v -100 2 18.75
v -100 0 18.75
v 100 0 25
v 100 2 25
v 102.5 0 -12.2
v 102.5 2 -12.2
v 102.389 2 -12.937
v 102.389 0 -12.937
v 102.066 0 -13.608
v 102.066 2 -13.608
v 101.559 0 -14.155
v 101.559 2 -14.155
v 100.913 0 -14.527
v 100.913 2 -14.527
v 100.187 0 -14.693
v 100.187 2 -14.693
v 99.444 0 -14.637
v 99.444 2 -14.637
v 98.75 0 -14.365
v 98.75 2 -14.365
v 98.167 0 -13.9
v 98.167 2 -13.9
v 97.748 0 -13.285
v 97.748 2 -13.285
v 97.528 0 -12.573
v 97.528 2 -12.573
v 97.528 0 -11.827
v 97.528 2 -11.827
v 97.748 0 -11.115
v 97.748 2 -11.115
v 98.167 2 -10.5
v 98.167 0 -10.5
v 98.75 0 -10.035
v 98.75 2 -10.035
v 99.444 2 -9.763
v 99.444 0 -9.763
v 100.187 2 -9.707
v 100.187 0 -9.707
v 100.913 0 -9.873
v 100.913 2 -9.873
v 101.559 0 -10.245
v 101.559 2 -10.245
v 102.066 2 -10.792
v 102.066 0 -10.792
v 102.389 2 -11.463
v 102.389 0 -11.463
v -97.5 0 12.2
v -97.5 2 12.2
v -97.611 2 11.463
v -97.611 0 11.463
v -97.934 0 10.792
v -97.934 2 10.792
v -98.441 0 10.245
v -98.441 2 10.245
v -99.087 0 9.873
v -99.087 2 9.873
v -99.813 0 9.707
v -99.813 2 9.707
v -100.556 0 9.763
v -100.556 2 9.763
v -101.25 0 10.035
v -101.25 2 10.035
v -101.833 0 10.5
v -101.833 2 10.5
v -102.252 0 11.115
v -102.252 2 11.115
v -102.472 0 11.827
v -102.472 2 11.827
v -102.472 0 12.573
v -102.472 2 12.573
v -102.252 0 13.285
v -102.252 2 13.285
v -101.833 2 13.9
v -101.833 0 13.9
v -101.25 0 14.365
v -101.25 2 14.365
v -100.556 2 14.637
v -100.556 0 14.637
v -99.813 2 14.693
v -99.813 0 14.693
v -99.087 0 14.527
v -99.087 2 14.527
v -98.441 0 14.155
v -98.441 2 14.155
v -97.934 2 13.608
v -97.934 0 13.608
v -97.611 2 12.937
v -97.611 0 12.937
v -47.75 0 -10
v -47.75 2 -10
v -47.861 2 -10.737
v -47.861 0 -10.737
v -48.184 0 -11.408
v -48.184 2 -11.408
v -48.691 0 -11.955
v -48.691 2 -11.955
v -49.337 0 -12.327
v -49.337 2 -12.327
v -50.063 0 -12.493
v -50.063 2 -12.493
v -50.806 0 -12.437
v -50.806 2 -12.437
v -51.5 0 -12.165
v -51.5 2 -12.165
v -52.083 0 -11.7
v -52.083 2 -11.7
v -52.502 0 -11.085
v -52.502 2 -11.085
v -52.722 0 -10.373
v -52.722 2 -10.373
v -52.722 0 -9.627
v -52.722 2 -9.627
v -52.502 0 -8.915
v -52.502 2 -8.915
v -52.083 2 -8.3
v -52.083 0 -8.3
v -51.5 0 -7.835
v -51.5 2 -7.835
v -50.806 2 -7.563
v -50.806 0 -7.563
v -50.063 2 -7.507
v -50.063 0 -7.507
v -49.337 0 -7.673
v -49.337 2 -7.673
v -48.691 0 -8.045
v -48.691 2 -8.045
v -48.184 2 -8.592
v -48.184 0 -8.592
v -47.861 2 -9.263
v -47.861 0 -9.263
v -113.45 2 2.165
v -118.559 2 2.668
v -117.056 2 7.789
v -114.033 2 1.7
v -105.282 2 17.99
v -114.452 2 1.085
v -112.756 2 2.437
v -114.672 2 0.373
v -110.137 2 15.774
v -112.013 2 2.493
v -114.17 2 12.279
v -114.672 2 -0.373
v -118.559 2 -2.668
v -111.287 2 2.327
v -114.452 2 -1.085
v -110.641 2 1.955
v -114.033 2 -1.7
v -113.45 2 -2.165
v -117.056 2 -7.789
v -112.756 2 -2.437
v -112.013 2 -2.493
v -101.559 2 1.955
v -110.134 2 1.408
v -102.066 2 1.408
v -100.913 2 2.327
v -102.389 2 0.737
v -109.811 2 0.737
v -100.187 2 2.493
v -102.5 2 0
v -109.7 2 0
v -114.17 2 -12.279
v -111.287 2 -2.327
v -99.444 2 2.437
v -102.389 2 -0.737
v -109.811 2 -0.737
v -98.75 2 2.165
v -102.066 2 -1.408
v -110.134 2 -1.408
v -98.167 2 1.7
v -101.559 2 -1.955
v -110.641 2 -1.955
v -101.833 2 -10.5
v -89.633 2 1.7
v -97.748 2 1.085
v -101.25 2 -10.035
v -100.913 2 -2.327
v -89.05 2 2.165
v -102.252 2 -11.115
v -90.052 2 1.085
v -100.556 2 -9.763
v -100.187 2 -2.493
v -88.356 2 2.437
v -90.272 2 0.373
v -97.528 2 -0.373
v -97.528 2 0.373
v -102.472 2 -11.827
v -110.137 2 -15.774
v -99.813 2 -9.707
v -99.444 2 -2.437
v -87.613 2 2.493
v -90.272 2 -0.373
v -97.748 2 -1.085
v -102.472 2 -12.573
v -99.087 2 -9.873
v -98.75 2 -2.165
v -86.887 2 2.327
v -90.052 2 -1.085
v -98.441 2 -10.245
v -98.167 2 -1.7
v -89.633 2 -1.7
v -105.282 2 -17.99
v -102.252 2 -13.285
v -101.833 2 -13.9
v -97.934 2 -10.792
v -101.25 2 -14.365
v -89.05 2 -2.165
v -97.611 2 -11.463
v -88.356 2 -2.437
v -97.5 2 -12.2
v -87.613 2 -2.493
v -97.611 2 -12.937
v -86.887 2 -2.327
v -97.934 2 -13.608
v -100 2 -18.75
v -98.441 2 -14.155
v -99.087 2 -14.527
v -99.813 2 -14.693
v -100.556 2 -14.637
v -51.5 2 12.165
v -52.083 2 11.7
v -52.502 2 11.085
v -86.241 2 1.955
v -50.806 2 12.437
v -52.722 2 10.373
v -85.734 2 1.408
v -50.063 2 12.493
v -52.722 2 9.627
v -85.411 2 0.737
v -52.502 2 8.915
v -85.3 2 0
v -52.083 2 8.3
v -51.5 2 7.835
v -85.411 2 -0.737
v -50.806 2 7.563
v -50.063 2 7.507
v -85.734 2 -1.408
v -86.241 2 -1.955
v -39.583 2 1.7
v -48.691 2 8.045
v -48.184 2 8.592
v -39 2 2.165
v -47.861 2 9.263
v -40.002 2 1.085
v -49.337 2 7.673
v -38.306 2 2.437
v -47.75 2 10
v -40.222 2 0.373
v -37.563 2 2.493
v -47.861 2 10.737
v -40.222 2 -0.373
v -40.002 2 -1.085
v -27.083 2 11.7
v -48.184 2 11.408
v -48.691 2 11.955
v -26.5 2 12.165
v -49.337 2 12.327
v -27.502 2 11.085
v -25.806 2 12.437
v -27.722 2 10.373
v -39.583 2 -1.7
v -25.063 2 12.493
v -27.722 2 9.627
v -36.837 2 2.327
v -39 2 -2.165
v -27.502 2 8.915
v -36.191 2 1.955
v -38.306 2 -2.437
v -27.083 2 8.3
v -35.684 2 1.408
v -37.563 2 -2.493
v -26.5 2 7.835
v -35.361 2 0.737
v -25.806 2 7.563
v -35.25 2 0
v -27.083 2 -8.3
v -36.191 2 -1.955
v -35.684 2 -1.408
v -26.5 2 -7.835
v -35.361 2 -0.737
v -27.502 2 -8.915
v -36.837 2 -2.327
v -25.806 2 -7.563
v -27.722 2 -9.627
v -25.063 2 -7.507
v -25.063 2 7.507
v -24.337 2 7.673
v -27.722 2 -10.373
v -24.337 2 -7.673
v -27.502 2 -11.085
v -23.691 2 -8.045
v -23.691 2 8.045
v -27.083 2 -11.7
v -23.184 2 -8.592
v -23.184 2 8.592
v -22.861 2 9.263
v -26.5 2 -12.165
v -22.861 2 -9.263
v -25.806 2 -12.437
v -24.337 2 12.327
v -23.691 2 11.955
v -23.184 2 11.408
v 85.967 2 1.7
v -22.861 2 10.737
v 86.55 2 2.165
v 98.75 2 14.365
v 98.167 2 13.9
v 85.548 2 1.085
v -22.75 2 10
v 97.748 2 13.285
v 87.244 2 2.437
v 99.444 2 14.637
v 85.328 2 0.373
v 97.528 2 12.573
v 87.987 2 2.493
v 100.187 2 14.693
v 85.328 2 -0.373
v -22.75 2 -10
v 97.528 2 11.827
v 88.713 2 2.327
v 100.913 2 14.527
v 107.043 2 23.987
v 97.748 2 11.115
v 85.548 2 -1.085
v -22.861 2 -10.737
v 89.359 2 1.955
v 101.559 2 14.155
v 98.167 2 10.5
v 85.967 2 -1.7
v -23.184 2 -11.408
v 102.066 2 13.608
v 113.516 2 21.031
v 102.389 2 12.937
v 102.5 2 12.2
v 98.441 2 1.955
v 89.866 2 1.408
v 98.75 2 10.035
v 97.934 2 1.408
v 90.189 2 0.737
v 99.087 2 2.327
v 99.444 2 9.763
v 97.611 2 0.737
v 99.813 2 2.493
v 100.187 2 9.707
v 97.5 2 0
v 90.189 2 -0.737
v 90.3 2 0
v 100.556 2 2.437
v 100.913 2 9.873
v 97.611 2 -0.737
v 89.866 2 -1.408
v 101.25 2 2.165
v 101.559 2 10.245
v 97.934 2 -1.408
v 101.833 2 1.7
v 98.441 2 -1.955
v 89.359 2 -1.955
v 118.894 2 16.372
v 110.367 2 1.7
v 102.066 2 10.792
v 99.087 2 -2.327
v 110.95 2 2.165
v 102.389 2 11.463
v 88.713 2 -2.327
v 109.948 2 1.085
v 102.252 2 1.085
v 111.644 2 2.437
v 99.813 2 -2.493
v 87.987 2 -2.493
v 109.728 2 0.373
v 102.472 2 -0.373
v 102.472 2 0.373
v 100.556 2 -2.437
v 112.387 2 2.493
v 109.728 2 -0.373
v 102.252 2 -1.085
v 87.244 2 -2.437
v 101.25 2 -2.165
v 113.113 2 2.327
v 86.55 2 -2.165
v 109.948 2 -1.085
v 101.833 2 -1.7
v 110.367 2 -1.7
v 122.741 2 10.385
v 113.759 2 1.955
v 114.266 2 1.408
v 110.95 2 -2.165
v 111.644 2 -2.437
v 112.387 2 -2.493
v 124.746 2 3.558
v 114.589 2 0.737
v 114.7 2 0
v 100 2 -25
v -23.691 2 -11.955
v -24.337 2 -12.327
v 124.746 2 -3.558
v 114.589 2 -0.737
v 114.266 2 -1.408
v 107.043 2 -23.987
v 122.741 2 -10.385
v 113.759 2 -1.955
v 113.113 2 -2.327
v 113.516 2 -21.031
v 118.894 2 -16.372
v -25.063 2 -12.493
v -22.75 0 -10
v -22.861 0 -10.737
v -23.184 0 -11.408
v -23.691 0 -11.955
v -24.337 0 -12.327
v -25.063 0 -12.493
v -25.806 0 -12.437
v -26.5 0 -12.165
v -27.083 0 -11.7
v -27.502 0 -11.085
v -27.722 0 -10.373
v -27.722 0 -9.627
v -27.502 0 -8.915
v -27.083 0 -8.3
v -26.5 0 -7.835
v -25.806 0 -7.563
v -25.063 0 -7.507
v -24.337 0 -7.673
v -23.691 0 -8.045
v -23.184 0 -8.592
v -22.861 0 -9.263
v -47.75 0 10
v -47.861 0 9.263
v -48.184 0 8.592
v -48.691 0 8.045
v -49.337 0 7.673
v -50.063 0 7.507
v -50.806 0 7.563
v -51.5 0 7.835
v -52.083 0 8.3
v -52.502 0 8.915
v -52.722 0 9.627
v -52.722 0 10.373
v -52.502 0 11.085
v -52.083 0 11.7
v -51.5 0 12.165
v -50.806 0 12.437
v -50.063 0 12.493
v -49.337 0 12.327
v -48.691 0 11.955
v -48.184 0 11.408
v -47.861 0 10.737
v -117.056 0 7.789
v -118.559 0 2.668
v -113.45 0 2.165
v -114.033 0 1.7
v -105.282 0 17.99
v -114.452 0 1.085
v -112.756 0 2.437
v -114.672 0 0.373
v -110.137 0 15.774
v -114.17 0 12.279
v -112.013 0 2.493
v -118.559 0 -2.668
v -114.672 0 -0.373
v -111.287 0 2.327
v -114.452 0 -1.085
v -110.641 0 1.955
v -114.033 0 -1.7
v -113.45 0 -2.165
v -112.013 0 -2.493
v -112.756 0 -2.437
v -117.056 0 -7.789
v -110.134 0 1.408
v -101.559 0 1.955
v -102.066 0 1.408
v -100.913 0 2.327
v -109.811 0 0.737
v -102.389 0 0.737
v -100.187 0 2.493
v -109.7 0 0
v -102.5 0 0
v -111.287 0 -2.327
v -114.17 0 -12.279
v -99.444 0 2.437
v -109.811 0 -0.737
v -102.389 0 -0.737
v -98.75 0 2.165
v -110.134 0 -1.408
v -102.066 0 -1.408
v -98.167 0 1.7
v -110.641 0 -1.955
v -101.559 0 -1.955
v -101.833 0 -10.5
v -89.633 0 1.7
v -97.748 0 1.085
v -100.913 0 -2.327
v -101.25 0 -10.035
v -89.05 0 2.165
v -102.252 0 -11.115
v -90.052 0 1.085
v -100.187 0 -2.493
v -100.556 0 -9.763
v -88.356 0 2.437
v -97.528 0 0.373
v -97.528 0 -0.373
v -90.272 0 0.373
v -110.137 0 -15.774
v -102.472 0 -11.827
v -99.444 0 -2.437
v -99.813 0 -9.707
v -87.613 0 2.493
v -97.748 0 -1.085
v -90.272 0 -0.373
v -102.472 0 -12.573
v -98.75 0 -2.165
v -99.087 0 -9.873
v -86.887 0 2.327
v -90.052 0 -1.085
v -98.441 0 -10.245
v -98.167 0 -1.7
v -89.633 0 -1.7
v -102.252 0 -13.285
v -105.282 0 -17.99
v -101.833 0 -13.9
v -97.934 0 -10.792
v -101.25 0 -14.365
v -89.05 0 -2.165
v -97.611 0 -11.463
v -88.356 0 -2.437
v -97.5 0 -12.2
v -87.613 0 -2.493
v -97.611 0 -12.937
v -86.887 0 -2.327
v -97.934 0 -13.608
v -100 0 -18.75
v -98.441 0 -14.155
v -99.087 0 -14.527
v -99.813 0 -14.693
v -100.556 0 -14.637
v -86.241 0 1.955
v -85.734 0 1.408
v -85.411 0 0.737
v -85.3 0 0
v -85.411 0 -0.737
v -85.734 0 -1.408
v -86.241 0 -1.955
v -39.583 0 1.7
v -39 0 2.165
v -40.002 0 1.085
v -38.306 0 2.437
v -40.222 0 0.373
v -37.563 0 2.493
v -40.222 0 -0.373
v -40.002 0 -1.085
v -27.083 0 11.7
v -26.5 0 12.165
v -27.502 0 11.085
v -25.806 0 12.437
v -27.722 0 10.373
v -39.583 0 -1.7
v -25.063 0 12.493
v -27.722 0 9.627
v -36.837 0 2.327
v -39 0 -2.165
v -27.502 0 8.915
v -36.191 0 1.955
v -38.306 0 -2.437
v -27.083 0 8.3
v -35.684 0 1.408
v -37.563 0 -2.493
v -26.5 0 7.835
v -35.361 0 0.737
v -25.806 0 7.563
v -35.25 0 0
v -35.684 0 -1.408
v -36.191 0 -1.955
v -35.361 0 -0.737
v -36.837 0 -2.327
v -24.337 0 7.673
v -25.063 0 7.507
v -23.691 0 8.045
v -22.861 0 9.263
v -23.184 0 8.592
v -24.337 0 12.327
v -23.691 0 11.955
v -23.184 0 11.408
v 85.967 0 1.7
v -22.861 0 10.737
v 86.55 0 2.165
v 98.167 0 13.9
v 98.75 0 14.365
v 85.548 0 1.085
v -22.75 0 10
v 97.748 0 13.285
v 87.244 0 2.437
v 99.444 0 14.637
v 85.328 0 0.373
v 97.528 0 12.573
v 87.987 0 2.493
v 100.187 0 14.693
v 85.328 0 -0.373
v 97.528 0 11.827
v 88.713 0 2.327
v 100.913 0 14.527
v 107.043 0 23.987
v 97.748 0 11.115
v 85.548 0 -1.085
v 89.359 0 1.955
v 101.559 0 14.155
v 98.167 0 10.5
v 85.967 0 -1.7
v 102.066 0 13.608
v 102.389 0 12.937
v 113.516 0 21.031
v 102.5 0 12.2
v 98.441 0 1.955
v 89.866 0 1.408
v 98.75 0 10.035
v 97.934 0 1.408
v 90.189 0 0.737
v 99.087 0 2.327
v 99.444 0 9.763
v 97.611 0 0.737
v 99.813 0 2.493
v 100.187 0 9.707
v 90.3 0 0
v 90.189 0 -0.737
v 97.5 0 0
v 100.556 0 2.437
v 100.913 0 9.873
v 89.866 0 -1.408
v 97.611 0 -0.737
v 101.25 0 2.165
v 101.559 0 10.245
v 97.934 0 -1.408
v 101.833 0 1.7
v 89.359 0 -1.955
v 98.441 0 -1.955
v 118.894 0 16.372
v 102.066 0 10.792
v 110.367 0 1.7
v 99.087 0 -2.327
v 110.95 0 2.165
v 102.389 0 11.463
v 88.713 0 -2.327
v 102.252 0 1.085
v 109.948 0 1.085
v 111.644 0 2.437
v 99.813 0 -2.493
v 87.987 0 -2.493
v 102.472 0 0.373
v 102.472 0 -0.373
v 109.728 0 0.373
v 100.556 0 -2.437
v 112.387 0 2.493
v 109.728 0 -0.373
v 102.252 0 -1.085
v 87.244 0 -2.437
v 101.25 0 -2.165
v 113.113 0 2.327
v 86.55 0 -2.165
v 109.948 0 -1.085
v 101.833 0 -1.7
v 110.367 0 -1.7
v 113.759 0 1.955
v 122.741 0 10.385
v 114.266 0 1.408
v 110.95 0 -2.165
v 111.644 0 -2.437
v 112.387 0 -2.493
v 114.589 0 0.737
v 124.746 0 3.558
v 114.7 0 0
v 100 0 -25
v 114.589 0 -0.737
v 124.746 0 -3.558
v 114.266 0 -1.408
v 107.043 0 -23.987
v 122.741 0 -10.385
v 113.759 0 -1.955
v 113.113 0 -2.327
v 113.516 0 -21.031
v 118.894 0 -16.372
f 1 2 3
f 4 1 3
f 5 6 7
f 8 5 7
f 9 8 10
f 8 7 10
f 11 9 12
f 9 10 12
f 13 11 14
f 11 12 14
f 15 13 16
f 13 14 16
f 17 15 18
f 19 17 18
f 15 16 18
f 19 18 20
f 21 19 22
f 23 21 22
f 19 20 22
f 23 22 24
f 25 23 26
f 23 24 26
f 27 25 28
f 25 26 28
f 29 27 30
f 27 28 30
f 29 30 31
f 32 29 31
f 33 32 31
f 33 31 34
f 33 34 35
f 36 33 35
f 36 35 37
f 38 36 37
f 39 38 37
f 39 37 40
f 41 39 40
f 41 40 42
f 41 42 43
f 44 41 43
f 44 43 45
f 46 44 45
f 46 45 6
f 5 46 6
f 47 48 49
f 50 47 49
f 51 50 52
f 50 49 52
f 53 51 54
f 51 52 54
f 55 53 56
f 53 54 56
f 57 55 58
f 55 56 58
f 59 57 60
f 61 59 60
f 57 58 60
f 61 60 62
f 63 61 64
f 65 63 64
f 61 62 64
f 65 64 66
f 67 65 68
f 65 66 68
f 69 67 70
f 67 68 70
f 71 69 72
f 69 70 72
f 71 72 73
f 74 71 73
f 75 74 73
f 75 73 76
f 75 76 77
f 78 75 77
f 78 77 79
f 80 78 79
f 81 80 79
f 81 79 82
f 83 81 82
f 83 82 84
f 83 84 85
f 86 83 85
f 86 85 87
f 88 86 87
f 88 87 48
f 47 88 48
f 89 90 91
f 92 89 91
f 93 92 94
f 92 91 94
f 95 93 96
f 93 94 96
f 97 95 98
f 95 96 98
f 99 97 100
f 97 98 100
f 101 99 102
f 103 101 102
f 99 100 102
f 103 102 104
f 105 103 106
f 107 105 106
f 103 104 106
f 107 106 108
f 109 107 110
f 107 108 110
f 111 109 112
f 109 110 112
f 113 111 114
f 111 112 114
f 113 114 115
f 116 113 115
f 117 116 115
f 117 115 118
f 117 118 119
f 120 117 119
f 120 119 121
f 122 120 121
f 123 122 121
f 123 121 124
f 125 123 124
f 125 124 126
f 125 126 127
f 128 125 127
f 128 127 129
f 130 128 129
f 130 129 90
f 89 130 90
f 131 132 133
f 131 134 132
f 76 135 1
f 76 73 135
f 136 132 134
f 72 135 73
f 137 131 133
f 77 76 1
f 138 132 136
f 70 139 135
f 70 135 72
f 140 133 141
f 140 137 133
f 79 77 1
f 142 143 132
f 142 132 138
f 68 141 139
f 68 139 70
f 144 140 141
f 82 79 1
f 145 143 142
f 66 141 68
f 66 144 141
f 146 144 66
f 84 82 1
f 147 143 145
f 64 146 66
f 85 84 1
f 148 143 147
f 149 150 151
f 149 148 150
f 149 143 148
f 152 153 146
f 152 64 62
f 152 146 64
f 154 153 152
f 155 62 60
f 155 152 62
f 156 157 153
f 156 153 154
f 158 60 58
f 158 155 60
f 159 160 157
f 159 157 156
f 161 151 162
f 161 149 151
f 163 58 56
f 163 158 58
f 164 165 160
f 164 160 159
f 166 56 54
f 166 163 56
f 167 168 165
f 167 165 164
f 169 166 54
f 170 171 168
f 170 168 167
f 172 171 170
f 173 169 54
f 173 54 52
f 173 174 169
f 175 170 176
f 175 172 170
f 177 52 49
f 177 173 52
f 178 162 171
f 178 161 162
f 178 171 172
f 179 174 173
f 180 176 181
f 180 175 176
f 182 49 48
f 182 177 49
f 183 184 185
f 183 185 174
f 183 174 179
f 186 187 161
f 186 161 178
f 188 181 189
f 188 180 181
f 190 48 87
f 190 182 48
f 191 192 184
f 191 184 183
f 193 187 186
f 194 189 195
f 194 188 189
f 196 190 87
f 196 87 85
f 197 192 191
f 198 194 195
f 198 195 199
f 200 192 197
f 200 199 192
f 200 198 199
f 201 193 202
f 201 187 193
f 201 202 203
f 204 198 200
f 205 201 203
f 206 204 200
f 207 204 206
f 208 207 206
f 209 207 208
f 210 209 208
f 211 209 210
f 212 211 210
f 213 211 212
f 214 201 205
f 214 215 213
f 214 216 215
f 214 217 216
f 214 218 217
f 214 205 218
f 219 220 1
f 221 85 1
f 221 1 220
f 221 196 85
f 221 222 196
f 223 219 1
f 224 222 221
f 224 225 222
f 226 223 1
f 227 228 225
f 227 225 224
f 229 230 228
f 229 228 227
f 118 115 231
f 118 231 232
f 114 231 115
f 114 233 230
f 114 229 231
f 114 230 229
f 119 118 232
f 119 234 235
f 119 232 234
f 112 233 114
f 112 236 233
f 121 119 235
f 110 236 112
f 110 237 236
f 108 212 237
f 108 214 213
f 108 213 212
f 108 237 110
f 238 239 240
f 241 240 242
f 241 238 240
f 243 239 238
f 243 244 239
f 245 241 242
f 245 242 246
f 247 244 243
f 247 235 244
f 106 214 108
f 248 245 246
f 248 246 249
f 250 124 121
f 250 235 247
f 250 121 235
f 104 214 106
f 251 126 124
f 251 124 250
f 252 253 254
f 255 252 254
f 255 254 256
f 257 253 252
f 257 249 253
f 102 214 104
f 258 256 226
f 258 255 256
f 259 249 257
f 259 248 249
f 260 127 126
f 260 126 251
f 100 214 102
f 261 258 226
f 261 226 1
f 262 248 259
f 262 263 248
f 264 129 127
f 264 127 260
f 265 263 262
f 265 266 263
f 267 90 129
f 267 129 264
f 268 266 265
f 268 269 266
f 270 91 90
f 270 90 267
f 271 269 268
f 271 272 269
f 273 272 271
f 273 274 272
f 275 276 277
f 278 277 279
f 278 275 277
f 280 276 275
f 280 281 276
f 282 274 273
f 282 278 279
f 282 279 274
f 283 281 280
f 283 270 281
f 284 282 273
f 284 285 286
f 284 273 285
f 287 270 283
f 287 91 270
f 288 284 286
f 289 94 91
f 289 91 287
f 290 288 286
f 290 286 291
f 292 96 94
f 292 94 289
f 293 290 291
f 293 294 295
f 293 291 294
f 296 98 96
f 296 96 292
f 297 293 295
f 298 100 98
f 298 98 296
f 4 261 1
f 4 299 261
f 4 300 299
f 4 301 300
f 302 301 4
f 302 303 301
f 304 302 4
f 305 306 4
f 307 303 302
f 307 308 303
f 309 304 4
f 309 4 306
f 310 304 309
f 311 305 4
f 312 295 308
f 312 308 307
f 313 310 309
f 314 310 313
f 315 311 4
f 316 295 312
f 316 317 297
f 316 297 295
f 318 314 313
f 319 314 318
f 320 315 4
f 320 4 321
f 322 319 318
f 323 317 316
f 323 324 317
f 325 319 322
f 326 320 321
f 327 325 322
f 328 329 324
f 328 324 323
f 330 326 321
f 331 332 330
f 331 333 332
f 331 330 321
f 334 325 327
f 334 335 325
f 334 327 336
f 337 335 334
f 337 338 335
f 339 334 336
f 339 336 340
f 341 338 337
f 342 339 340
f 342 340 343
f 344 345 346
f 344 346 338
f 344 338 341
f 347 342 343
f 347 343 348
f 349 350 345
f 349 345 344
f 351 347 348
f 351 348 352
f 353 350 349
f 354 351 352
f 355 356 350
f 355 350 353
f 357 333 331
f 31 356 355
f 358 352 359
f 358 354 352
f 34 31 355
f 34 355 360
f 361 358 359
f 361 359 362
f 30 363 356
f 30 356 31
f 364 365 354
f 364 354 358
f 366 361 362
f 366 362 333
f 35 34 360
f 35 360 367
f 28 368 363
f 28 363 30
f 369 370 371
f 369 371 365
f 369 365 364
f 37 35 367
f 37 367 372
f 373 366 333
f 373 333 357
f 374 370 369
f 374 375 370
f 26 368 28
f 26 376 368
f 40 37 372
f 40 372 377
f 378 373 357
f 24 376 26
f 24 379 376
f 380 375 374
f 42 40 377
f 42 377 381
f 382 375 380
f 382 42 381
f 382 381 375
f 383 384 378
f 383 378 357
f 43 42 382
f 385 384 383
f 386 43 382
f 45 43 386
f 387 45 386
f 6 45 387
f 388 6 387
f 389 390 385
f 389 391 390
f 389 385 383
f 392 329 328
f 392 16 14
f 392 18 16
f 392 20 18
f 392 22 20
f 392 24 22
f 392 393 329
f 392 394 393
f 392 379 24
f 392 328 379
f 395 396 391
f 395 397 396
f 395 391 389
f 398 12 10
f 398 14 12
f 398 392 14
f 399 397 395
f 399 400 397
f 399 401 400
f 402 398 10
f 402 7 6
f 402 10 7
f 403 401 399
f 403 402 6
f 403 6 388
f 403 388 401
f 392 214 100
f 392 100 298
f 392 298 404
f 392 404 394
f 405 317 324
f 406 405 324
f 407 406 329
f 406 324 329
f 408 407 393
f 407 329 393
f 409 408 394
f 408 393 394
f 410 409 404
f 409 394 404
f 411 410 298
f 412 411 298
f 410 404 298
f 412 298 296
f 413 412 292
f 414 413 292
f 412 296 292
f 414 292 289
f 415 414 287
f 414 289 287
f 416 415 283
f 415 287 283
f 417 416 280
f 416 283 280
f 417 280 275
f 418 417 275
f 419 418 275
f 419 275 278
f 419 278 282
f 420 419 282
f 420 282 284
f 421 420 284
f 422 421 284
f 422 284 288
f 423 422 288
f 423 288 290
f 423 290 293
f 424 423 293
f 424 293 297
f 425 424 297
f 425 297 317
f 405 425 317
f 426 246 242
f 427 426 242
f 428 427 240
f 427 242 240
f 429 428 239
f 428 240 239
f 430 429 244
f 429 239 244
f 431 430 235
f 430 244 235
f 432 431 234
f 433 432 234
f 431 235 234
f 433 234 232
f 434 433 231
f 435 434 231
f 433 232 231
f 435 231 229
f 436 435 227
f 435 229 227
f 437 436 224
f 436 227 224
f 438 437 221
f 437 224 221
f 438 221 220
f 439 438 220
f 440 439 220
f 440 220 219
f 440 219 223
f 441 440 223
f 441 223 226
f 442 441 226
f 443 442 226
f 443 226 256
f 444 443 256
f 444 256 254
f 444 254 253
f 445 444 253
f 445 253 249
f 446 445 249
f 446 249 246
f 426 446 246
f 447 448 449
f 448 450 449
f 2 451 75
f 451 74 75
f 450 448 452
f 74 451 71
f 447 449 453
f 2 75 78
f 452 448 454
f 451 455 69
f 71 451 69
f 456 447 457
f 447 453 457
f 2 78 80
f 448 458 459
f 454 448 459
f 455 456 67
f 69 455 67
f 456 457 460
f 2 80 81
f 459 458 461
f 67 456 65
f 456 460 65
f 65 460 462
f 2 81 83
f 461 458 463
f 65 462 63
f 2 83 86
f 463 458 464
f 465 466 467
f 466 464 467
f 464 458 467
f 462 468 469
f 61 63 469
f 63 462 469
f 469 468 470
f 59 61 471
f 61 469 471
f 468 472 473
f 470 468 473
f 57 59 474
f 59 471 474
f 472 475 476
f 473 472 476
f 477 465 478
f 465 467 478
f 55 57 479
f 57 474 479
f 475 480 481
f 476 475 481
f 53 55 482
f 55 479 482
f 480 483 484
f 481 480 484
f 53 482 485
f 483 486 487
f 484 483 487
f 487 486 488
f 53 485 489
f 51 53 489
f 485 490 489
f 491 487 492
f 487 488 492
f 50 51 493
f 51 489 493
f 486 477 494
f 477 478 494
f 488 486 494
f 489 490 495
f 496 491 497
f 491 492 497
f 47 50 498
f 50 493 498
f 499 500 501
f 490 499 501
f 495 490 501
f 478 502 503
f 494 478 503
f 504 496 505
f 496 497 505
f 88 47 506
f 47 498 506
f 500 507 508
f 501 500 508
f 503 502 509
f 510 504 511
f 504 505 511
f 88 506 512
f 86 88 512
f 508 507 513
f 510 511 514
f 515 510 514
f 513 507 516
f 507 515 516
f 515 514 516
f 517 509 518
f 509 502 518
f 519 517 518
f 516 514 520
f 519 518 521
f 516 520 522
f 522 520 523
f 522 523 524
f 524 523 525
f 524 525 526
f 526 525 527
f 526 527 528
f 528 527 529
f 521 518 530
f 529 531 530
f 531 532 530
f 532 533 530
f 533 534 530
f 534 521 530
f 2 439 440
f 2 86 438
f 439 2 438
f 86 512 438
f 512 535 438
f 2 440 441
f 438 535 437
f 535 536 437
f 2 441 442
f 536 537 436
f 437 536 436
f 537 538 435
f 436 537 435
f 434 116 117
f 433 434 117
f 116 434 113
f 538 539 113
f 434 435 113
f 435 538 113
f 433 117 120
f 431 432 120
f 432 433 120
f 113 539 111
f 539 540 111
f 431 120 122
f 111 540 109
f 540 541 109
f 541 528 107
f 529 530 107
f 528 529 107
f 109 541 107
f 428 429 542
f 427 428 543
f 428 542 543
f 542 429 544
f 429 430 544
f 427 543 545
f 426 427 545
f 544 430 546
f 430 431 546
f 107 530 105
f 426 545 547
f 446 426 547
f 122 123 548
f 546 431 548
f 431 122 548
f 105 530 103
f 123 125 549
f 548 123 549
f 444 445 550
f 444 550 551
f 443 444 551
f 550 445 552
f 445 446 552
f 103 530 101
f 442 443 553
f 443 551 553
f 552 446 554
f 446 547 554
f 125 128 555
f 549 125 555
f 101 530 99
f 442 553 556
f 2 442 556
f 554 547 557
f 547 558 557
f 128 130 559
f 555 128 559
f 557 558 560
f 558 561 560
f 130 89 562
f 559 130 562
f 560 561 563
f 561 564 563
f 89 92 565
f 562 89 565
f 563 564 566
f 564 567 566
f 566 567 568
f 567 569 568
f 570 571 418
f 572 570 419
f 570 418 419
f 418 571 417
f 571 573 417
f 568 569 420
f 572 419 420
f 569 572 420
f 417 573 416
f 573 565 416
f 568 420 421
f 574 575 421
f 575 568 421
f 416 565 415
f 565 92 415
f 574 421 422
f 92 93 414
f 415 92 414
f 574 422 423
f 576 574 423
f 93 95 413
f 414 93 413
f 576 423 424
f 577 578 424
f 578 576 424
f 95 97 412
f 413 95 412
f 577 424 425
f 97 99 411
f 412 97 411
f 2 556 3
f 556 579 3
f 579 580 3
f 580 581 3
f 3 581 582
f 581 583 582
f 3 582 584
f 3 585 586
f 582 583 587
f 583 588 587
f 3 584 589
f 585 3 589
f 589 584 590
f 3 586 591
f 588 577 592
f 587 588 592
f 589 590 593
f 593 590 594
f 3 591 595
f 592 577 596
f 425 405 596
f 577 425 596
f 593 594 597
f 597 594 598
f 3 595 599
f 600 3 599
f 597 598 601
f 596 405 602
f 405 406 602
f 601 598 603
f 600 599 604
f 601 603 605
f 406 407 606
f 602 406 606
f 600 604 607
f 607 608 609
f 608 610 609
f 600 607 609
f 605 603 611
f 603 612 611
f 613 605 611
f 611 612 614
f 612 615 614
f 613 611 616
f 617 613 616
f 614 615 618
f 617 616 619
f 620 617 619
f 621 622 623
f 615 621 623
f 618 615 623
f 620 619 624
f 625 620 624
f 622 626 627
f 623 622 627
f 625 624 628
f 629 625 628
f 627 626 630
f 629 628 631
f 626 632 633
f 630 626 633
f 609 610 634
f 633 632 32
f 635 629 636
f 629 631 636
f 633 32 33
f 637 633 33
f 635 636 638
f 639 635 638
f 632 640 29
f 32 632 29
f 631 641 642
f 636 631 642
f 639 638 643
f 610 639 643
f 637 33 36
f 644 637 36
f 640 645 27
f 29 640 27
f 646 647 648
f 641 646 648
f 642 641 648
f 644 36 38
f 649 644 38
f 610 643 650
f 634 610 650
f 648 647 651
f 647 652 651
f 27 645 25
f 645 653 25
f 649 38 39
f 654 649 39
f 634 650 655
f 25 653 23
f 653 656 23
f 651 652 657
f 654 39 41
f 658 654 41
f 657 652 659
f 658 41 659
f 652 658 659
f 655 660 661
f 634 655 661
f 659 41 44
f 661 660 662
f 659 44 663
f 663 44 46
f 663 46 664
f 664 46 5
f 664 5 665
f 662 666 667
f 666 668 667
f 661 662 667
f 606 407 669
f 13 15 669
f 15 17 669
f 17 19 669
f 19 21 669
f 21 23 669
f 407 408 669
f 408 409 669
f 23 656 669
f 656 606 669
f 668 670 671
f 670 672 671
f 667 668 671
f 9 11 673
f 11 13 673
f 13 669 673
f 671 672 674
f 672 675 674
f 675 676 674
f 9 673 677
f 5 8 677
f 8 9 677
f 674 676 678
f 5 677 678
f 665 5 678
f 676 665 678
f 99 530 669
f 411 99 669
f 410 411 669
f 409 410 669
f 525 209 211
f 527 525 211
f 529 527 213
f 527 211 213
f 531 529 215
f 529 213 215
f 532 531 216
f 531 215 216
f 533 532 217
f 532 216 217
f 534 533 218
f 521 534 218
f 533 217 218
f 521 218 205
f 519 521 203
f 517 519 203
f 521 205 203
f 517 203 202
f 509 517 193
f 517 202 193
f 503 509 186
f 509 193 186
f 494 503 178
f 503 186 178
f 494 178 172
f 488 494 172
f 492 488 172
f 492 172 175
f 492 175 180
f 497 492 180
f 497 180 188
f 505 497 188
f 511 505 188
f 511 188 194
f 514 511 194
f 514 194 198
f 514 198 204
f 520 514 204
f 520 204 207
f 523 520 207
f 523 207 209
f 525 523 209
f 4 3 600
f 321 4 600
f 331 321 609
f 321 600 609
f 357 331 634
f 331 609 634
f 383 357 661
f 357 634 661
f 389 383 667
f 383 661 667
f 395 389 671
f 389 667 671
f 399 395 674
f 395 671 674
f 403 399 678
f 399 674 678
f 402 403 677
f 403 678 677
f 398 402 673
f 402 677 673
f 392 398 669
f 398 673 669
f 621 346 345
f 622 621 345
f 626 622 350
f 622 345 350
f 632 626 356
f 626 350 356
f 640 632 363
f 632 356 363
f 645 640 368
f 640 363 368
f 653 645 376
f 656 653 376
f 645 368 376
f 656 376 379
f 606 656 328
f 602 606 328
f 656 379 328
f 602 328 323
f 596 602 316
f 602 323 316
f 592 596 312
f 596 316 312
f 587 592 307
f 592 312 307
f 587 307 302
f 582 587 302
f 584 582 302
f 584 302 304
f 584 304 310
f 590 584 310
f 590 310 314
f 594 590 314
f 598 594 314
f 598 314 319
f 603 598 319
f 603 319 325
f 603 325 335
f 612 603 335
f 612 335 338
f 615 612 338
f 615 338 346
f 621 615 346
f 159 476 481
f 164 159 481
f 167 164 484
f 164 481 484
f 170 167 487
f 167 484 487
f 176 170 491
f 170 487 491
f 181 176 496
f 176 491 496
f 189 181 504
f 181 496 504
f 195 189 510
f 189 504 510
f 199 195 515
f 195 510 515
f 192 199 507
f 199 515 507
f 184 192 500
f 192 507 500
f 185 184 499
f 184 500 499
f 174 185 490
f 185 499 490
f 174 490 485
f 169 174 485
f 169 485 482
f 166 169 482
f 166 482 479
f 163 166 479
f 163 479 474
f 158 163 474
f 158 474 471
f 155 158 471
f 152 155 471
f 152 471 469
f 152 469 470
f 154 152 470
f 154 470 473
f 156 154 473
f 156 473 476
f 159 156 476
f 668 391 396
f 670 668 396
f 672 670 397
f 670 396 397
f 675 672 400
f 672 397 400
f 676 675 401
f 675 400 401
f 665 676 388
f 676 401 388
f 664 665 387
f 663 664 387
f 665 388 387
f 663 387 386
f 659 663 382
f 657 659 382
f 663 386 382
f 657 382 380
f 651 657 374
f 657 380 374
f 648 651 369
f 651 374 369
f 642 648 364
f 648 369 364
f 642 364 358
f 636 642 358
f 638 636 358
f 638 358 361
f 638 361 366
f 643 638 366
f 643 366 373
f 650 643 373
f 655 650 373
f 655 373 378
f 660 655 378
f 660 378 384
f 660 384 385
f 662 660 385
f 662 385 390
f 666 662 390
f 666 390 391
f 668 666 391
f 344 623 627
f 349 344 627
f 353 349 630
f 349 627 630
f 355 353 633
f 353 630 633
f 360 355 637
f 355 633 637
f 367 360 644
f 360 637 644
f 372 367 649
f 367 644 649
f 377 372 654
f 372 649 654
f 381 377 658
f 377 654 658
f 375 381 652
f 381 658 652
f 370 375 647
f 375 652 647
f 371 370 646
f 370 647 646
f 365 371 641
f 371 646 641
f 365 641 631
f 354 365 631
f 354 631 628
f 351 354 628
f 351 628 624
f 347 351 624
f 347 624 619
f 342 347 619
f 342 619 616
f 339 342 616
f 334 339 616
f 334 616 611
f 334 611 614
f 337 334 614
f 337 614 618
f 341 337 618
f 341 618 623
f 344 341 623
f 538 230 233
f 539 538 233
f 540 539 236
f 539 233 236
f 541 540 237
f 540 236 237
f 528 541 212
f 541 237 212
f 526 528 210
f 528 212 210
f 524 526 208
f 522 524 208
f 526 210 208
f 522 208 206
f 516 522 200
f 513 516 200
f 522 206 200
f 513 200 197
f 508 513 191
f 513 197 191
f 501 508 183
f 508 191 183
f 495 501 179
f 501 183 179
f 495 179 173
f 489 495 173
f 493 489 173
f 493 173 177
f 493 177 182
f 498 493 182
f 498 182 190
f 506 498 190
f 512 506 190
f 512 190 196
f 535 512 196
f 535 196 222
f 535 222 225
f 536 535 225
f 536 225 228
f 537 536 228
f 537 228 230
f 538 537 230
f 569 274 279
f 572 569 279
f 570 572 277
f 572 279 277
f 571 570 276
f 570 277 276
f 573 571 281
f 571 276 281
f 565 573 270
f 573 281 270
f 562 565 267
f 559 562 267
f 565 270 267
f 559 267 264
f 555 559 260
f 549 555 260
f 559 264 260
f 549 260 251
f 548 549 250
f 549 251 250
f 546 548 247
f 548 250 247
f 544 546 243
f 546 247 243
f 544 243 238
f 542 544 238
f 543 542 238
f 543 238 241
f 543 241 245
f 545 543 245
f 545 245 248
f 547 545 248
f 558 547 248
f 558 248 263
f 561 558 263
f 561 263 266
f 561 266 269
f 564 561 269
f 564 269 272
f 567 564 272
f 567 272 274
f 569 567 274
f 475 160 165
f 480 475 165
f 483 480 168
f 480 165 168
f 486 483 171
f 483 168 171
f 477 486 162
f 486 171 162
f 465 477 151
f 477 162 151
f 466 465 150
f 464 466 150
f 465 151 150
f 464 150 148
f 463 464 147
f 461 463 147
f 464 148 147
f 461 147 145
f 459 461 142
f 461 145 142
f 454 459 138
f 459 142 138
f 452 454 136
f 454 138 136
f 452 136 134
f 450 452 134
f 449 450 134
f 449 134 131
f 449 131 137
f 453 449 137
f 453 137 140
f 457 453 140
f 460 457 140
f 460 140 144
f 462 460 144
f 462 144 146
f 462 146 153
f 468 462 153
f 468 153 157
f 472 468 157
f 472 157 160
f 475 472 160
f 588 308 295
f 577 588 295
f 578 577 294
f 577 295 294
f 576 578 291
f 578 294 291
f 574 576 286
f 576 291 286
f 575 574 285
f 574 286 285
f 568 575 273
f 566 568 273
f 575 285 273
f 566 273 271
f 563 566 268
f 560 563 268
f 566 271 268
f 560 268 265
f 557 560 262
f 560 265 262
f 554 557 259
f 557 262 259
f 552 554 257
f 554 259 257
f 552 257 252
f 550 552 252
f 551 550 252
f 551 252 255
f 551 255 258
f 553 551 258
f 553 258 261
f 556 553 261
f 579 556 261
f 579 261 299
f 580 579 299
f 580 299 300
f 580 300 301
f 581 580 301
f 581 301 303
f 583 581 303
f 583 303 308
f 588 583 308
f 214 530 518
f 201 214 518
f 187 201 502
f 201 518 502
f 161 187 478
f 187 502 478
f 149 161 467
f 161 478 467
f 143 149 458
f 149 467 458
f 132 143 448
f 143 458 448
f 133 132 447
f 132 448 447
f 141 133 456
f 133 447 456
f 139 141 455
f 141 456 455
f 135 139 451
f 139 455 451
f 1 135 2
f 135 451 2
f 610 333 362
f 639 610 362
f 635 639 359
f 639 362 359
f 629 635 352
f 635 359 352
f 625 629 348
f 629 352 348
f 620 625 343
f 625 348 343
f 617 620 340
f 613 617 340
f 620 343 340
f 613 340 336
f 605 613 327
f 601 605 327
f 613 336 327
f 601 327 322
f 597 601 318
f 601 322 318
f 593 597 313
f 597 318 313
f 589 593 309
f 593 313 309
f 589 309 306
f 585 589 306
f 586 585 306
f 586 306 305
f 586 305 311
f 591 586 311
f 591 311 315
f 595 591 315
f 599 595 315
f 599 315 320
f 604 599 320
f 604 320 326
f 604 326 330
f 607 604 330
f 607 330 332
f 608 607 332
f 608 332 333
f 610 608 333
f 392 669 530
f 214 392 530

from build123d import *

# Parameters (mm, degrees)
BOSS_EXTRUDE1_DEPTH       = 2
F_5_0MM_DOWEL_HOLE1_D     = 5
F_5_0MM_DOWEL_HOLE1_DEPTH = 2
CUT_EXTRUDE1_REACH        = 4
SKETCH4_R                 = 2.5
CUT_EXTRUDE2_REACH        = 4
SKETCH16_R                = 2.5


with BuildPart() as part:
    # Sketch2 → Boss-Extrude1 (new body)
    with BuildSketch(Plane(origin=(0, 0, 0), x_dir=(1, 0, 0), z_dir=(0, 1, 0))):
        with BuildLine():
            Line((100, 25), (-100, 18.75))
            ThreePointArc((-100, 18.75), (-118.75, 0), (-100, -18.75))
            Line((-100, -18.75), (100, -25))
            ThreePointArc((100, -25), (125, 0), (100, 25))
        make_face()
    extrude(amount=BOSS_EXTRUDE1_DEPTH)

    # Ø5.0mm Dowel Hole1
    with Locations(Plane(origin=(0, 2, 0), x_dir=(1, 0, 0), z_dir=(0, 1, 0))):
        with Locations((100, 0), (-100, 0)):
            Hole(F_5_0MM_DOWEL_HOLE1_D / 2, depth=F_5_0MM_DOWEL_HOLE1_DEPTH)

    # Sketch4 → Cut-Extrude1 (cut, up to next)
    with BuildSketch(Plane(origin=(0, 2, 0), x_dir=(1, 0, 0), z_dir=(0, 1, 0)), mode=Mode.PRIVATE) as cut_extrude1_sk1:
        with Locations((100, 12.2)):
            Circle(SKETCH4_R)
    cut_extrude1_tool1 = extrude(cut_extrude1_sk1.sketch, amount=-CUT_EXTRUDE1_REACH, mode=Mode.PRIVATE) & part.part
    add(cut_extrude1_tool1.solids().sort_by_distance((100, 2, -12.2))[0], mode=Mode.SUBTRACT)
    # Sketch4 → Cut-Extrude1 (cut, up to next)
    with BuildSketch(Plane(origin=(0, 2, 0), x_dir=(1, 0, 0), z_dir=(0, 1, 0)), mode=Mode.PRIVATE) as cut_extrude1_sk2:
        with Locations((100, -12.2)):
            Circle(SKETCH4_R)
    cut_extrude1_tool2 = extrude(cut_extrude1_sk2.sketch, amount=-CUT_EXTRUDE1_REACH, mode=Mode.PRIVATE) & part.part
    add(cut_extrude1_tool2.solids().sort_by_distance((100, 2, 12.2))[0], mode=Mode.SUBTRACT)
    # Sketch4 → Cut-Extrude1 (cut, up to next)
    with BuildSketch(Plane(origin=(0, 2, 0), x_dir=(1, 0, 0), z_dir=(0, 1, 0)), mode=Mode.PRIVATE) as cut_extrude1_sk3:
        with Locations((112.2, 0)):
            Circle(SKETCH4_R)
    cut_extrude1_tool3 = extrude(cut_extrude1_sk3.sketch, amount=-CUT_EXTRUDE1_REACH, mode=Mode.PRIVATE) & part.part
    add(cut_extrude1_tool3.solids().sort_by_distance((112.2, 2, 0))[0], mode=Mode.SUBTRACT)
    # Sketch4 → Cut-Extrude1 (cut, up to next)
    with BuildSketch(Plane(origin=(0, 2, 0), x_dir=(1, 0, 0), z_dir=(0, 1, 0)), mode=Mode.PRIVATE) as cut_extrude1_sk4:
        with Locations((87.8, 0)):
            Circle(SKETCH4_R)
    cut_extrude1_tool4 = extrude(cut_extrude1_sk4.sketch, amount=-CUT_EXTRUDE1_REACH, mode=Mode.PRIVATE) & part.part
    add(cut_extrude1_tool4.solids().sort_by_distance((87.8, 2, 0))[0], mode=Mode.SUBTRACT)
    # Sketch4 → Cut-Extrude1 (cut, up to next)
    with BuildSketch(Plane(origin=(0, 2, 0), x_dir=(1, 0, 0), z_dir=(0, 1, 0)), mode=Mode.PRIVATE) as cut_extrude1_sk5:
        with Locations((-100, 12.2)):
            Circle(SKETCH4_R)
    cut_extrude1_tool5 = extrude(cut_extrude1_sk5.sketch, amount=-CUT_EXTRUDE1_REACH, mode=Mode.PRIVATE) & part.part
    add(cut_extrude1_tool5.solids().sort_by_distance((-100, 2, -12.2))[0], mode=Mode.SUBTRACT)
    # Sketch4 → Cut-Extrude1 (cut, up to next)
    with BuildSketch(Plane(origin=(0, 2, 0), x_dir=(1, 0, 0), z_dir=(0, 1, 0)), mode=Mode.PRIVATE) as cut_extrude1_sk6:
        with Locations((-87.8, 0)):
            Circle(SKETCH4_R)
    cut_extrude1_tool6 = extrude(cut_extrude1_sk6.sketch, amount=-CUT_EXTRUDE1_REACH, mode=Mode.PRIVATE) & part.part
    add(cut_extrude1_tool6.solids().sort_by_distance((-87.8, 2, 0))[0], mode=Mode.SUBTRACT)
    # Sketch4 → Cut-Extrude1 (cut, up to next)
    with BuildSketch(Plane(origin=(0, 2, 0), x_dir=(1, 0, 0), z_dir=(0, 1, 0)), mode=Mode.PRIVATE) as cut_extrude1_sk7:
        with Locations((-112.2, 0)):
            Circle(SKETCH4_R)
    cut_extrude1_tool7 = extrude(cut_extrude1_sk7.sketch, amount=-CUT_EXTRUDE1_REACH, mode=Mode.PRIVATE) & part.part
    add(cut_extrude1_tool7.solids().sort_by_distance((-112.2, 2, 0))[0], mode=Mode.SUBTRACT)
    # Sketch4 → Cut-Extrude1 (cut, up to next)
    with BuildSketch(Plane(origin=(0, 2, 0), x_dir=(1, 0, 0), z_dir=(0, 1, 0)), mode=Mode.PRIVATE) as cut_extrude1_sk8:
        with Locations((-100, -12.2)):
            Circle(SKETCH4_R)
    cut_extrude1_tool8 = extrude(cut_extrude1_sk8.sketch, amount=-CUT_EXTRUDE1_REACH, mode=Mode.PRIVATE) & part.part
    add(cut_extrude1_tool8.solids().sort_by_distance((-100, 2, 12.2))[0], mode=Mode.SUBTRACT)

    # Sketch16 → Cut-Extrude2 (cut, up to next)
    with BuildSketch(Plane(origin=(0, 2, 0), x_dir=(1, 0, 0), z_dir=(0, 1, 0)), mode=Mode.PRIVATE) as cut_extrude2_sk1:
        with Locations((-37.749999999, 0)):
            Circle(SKETCH16_R)
    cut_extrude2_tool1 = extrude(cut_extrude2_sk1.sketch, amount=-CUT_EXTRUDE2_REACH, mode=Mode.PRIVATE) & part.part
    add(cut_extrude2_tool1.solids().sort_by_distance((-37.75, 2, 0))[0], mode=Mode.SUBTRACT)
    # Sketch16 → Cut-Extrude2 (cut, up to next)
    with BuildSketch(Plane(origin=(0, 2, 0), x_dir=(1, 0, 0), z_dir=(0, 1, 0)), mode=Mode.PRIVATE) as cut_extrude2_sk2:
        with Locations((-25.249999999, 10)):
            Circle(SKETCH16_R)
    cut_extrude2_tool2 = extrude(cut_extrude2_sk2.sketch, amount=-CUT_EXTRUDE2_REACH, mode=Mode.PRIVATE) & part.part
    add(cut_extrude2_tool2.solids().sort_by_distance((-25.25, 2, -10))[0], mode=Mode.SUBTRACT)
    # Sketch16 → Cut-Extrude2 (cut, up to next)
    with BuildSketch(Plane(origin=(0, 2, 0), x_dir=(1, 0, 0), z_dir=(0, 1, 0)), mode=Mode.PRIVATE) as cut_extrude2_sk3:
        with Locations((-25.249999999, -10)):
            Circle(SKETCH16_R)
    cut_extrude2_tool3 = extrude(cut_extrude2_sk3.sketch, amount=-CUT_EXTRUDE2_REACH, mode=Mode.PRIVATE) & part.part
    add(cut_extrude2_tool3.solids().sort_by_distance((-25.25, 2, 10))[0], mode=Mode.SUBTRACT)
    # Sketch16 → Cut-Extrude2 (cut, up to next)
    with BuildSketch(Plane(origin=(0, 2, 0), x_dir=(1, 0, 0), z_dir=(0, 1, 0)), mode=Mode.PRIVATE) as cut_extrude2_sk4:
        with Locations((-50.249999999, 10)):
            Circle(SKETCH16_R)
    cut_extrude2_tool4 = extrude(cut_extrude2_sk4.sketch, amount=-CUT_EXTRUDE2_REACH, mode=Mode.PRIVATE) & part.part
    add(cut_extrude2_tool4.solids().sort_by_distance((-50.25, 2, -10))[0], mode=Mode.SUBTRACT)
    # Sketch16 → Cut-Extrude2 (cut, up to next)
    with BuildSketch(Plane(origin=(0, 2, 0), x_dir=(1, 0, 0), z_dir=(0, 1, 0)), mode=Mode.PRIVATE) as cut_extrude2_sk5:
        with Locations((-50.249999999, -10)):
            Circle(SKETCH16_R)
    cut_extrude2_tool5 = extrude(cut_extrude2_sk5.sketch, amount=-CUT_EXTRUDE2_REACH, mode=Mode.PRIVATE) & part.part
    add(cut_extrude2_tool5.solids().sort_by_distance((-50.25, 2, 10))[0], mode=Mode.SUBTRACT)


solid = part.part
